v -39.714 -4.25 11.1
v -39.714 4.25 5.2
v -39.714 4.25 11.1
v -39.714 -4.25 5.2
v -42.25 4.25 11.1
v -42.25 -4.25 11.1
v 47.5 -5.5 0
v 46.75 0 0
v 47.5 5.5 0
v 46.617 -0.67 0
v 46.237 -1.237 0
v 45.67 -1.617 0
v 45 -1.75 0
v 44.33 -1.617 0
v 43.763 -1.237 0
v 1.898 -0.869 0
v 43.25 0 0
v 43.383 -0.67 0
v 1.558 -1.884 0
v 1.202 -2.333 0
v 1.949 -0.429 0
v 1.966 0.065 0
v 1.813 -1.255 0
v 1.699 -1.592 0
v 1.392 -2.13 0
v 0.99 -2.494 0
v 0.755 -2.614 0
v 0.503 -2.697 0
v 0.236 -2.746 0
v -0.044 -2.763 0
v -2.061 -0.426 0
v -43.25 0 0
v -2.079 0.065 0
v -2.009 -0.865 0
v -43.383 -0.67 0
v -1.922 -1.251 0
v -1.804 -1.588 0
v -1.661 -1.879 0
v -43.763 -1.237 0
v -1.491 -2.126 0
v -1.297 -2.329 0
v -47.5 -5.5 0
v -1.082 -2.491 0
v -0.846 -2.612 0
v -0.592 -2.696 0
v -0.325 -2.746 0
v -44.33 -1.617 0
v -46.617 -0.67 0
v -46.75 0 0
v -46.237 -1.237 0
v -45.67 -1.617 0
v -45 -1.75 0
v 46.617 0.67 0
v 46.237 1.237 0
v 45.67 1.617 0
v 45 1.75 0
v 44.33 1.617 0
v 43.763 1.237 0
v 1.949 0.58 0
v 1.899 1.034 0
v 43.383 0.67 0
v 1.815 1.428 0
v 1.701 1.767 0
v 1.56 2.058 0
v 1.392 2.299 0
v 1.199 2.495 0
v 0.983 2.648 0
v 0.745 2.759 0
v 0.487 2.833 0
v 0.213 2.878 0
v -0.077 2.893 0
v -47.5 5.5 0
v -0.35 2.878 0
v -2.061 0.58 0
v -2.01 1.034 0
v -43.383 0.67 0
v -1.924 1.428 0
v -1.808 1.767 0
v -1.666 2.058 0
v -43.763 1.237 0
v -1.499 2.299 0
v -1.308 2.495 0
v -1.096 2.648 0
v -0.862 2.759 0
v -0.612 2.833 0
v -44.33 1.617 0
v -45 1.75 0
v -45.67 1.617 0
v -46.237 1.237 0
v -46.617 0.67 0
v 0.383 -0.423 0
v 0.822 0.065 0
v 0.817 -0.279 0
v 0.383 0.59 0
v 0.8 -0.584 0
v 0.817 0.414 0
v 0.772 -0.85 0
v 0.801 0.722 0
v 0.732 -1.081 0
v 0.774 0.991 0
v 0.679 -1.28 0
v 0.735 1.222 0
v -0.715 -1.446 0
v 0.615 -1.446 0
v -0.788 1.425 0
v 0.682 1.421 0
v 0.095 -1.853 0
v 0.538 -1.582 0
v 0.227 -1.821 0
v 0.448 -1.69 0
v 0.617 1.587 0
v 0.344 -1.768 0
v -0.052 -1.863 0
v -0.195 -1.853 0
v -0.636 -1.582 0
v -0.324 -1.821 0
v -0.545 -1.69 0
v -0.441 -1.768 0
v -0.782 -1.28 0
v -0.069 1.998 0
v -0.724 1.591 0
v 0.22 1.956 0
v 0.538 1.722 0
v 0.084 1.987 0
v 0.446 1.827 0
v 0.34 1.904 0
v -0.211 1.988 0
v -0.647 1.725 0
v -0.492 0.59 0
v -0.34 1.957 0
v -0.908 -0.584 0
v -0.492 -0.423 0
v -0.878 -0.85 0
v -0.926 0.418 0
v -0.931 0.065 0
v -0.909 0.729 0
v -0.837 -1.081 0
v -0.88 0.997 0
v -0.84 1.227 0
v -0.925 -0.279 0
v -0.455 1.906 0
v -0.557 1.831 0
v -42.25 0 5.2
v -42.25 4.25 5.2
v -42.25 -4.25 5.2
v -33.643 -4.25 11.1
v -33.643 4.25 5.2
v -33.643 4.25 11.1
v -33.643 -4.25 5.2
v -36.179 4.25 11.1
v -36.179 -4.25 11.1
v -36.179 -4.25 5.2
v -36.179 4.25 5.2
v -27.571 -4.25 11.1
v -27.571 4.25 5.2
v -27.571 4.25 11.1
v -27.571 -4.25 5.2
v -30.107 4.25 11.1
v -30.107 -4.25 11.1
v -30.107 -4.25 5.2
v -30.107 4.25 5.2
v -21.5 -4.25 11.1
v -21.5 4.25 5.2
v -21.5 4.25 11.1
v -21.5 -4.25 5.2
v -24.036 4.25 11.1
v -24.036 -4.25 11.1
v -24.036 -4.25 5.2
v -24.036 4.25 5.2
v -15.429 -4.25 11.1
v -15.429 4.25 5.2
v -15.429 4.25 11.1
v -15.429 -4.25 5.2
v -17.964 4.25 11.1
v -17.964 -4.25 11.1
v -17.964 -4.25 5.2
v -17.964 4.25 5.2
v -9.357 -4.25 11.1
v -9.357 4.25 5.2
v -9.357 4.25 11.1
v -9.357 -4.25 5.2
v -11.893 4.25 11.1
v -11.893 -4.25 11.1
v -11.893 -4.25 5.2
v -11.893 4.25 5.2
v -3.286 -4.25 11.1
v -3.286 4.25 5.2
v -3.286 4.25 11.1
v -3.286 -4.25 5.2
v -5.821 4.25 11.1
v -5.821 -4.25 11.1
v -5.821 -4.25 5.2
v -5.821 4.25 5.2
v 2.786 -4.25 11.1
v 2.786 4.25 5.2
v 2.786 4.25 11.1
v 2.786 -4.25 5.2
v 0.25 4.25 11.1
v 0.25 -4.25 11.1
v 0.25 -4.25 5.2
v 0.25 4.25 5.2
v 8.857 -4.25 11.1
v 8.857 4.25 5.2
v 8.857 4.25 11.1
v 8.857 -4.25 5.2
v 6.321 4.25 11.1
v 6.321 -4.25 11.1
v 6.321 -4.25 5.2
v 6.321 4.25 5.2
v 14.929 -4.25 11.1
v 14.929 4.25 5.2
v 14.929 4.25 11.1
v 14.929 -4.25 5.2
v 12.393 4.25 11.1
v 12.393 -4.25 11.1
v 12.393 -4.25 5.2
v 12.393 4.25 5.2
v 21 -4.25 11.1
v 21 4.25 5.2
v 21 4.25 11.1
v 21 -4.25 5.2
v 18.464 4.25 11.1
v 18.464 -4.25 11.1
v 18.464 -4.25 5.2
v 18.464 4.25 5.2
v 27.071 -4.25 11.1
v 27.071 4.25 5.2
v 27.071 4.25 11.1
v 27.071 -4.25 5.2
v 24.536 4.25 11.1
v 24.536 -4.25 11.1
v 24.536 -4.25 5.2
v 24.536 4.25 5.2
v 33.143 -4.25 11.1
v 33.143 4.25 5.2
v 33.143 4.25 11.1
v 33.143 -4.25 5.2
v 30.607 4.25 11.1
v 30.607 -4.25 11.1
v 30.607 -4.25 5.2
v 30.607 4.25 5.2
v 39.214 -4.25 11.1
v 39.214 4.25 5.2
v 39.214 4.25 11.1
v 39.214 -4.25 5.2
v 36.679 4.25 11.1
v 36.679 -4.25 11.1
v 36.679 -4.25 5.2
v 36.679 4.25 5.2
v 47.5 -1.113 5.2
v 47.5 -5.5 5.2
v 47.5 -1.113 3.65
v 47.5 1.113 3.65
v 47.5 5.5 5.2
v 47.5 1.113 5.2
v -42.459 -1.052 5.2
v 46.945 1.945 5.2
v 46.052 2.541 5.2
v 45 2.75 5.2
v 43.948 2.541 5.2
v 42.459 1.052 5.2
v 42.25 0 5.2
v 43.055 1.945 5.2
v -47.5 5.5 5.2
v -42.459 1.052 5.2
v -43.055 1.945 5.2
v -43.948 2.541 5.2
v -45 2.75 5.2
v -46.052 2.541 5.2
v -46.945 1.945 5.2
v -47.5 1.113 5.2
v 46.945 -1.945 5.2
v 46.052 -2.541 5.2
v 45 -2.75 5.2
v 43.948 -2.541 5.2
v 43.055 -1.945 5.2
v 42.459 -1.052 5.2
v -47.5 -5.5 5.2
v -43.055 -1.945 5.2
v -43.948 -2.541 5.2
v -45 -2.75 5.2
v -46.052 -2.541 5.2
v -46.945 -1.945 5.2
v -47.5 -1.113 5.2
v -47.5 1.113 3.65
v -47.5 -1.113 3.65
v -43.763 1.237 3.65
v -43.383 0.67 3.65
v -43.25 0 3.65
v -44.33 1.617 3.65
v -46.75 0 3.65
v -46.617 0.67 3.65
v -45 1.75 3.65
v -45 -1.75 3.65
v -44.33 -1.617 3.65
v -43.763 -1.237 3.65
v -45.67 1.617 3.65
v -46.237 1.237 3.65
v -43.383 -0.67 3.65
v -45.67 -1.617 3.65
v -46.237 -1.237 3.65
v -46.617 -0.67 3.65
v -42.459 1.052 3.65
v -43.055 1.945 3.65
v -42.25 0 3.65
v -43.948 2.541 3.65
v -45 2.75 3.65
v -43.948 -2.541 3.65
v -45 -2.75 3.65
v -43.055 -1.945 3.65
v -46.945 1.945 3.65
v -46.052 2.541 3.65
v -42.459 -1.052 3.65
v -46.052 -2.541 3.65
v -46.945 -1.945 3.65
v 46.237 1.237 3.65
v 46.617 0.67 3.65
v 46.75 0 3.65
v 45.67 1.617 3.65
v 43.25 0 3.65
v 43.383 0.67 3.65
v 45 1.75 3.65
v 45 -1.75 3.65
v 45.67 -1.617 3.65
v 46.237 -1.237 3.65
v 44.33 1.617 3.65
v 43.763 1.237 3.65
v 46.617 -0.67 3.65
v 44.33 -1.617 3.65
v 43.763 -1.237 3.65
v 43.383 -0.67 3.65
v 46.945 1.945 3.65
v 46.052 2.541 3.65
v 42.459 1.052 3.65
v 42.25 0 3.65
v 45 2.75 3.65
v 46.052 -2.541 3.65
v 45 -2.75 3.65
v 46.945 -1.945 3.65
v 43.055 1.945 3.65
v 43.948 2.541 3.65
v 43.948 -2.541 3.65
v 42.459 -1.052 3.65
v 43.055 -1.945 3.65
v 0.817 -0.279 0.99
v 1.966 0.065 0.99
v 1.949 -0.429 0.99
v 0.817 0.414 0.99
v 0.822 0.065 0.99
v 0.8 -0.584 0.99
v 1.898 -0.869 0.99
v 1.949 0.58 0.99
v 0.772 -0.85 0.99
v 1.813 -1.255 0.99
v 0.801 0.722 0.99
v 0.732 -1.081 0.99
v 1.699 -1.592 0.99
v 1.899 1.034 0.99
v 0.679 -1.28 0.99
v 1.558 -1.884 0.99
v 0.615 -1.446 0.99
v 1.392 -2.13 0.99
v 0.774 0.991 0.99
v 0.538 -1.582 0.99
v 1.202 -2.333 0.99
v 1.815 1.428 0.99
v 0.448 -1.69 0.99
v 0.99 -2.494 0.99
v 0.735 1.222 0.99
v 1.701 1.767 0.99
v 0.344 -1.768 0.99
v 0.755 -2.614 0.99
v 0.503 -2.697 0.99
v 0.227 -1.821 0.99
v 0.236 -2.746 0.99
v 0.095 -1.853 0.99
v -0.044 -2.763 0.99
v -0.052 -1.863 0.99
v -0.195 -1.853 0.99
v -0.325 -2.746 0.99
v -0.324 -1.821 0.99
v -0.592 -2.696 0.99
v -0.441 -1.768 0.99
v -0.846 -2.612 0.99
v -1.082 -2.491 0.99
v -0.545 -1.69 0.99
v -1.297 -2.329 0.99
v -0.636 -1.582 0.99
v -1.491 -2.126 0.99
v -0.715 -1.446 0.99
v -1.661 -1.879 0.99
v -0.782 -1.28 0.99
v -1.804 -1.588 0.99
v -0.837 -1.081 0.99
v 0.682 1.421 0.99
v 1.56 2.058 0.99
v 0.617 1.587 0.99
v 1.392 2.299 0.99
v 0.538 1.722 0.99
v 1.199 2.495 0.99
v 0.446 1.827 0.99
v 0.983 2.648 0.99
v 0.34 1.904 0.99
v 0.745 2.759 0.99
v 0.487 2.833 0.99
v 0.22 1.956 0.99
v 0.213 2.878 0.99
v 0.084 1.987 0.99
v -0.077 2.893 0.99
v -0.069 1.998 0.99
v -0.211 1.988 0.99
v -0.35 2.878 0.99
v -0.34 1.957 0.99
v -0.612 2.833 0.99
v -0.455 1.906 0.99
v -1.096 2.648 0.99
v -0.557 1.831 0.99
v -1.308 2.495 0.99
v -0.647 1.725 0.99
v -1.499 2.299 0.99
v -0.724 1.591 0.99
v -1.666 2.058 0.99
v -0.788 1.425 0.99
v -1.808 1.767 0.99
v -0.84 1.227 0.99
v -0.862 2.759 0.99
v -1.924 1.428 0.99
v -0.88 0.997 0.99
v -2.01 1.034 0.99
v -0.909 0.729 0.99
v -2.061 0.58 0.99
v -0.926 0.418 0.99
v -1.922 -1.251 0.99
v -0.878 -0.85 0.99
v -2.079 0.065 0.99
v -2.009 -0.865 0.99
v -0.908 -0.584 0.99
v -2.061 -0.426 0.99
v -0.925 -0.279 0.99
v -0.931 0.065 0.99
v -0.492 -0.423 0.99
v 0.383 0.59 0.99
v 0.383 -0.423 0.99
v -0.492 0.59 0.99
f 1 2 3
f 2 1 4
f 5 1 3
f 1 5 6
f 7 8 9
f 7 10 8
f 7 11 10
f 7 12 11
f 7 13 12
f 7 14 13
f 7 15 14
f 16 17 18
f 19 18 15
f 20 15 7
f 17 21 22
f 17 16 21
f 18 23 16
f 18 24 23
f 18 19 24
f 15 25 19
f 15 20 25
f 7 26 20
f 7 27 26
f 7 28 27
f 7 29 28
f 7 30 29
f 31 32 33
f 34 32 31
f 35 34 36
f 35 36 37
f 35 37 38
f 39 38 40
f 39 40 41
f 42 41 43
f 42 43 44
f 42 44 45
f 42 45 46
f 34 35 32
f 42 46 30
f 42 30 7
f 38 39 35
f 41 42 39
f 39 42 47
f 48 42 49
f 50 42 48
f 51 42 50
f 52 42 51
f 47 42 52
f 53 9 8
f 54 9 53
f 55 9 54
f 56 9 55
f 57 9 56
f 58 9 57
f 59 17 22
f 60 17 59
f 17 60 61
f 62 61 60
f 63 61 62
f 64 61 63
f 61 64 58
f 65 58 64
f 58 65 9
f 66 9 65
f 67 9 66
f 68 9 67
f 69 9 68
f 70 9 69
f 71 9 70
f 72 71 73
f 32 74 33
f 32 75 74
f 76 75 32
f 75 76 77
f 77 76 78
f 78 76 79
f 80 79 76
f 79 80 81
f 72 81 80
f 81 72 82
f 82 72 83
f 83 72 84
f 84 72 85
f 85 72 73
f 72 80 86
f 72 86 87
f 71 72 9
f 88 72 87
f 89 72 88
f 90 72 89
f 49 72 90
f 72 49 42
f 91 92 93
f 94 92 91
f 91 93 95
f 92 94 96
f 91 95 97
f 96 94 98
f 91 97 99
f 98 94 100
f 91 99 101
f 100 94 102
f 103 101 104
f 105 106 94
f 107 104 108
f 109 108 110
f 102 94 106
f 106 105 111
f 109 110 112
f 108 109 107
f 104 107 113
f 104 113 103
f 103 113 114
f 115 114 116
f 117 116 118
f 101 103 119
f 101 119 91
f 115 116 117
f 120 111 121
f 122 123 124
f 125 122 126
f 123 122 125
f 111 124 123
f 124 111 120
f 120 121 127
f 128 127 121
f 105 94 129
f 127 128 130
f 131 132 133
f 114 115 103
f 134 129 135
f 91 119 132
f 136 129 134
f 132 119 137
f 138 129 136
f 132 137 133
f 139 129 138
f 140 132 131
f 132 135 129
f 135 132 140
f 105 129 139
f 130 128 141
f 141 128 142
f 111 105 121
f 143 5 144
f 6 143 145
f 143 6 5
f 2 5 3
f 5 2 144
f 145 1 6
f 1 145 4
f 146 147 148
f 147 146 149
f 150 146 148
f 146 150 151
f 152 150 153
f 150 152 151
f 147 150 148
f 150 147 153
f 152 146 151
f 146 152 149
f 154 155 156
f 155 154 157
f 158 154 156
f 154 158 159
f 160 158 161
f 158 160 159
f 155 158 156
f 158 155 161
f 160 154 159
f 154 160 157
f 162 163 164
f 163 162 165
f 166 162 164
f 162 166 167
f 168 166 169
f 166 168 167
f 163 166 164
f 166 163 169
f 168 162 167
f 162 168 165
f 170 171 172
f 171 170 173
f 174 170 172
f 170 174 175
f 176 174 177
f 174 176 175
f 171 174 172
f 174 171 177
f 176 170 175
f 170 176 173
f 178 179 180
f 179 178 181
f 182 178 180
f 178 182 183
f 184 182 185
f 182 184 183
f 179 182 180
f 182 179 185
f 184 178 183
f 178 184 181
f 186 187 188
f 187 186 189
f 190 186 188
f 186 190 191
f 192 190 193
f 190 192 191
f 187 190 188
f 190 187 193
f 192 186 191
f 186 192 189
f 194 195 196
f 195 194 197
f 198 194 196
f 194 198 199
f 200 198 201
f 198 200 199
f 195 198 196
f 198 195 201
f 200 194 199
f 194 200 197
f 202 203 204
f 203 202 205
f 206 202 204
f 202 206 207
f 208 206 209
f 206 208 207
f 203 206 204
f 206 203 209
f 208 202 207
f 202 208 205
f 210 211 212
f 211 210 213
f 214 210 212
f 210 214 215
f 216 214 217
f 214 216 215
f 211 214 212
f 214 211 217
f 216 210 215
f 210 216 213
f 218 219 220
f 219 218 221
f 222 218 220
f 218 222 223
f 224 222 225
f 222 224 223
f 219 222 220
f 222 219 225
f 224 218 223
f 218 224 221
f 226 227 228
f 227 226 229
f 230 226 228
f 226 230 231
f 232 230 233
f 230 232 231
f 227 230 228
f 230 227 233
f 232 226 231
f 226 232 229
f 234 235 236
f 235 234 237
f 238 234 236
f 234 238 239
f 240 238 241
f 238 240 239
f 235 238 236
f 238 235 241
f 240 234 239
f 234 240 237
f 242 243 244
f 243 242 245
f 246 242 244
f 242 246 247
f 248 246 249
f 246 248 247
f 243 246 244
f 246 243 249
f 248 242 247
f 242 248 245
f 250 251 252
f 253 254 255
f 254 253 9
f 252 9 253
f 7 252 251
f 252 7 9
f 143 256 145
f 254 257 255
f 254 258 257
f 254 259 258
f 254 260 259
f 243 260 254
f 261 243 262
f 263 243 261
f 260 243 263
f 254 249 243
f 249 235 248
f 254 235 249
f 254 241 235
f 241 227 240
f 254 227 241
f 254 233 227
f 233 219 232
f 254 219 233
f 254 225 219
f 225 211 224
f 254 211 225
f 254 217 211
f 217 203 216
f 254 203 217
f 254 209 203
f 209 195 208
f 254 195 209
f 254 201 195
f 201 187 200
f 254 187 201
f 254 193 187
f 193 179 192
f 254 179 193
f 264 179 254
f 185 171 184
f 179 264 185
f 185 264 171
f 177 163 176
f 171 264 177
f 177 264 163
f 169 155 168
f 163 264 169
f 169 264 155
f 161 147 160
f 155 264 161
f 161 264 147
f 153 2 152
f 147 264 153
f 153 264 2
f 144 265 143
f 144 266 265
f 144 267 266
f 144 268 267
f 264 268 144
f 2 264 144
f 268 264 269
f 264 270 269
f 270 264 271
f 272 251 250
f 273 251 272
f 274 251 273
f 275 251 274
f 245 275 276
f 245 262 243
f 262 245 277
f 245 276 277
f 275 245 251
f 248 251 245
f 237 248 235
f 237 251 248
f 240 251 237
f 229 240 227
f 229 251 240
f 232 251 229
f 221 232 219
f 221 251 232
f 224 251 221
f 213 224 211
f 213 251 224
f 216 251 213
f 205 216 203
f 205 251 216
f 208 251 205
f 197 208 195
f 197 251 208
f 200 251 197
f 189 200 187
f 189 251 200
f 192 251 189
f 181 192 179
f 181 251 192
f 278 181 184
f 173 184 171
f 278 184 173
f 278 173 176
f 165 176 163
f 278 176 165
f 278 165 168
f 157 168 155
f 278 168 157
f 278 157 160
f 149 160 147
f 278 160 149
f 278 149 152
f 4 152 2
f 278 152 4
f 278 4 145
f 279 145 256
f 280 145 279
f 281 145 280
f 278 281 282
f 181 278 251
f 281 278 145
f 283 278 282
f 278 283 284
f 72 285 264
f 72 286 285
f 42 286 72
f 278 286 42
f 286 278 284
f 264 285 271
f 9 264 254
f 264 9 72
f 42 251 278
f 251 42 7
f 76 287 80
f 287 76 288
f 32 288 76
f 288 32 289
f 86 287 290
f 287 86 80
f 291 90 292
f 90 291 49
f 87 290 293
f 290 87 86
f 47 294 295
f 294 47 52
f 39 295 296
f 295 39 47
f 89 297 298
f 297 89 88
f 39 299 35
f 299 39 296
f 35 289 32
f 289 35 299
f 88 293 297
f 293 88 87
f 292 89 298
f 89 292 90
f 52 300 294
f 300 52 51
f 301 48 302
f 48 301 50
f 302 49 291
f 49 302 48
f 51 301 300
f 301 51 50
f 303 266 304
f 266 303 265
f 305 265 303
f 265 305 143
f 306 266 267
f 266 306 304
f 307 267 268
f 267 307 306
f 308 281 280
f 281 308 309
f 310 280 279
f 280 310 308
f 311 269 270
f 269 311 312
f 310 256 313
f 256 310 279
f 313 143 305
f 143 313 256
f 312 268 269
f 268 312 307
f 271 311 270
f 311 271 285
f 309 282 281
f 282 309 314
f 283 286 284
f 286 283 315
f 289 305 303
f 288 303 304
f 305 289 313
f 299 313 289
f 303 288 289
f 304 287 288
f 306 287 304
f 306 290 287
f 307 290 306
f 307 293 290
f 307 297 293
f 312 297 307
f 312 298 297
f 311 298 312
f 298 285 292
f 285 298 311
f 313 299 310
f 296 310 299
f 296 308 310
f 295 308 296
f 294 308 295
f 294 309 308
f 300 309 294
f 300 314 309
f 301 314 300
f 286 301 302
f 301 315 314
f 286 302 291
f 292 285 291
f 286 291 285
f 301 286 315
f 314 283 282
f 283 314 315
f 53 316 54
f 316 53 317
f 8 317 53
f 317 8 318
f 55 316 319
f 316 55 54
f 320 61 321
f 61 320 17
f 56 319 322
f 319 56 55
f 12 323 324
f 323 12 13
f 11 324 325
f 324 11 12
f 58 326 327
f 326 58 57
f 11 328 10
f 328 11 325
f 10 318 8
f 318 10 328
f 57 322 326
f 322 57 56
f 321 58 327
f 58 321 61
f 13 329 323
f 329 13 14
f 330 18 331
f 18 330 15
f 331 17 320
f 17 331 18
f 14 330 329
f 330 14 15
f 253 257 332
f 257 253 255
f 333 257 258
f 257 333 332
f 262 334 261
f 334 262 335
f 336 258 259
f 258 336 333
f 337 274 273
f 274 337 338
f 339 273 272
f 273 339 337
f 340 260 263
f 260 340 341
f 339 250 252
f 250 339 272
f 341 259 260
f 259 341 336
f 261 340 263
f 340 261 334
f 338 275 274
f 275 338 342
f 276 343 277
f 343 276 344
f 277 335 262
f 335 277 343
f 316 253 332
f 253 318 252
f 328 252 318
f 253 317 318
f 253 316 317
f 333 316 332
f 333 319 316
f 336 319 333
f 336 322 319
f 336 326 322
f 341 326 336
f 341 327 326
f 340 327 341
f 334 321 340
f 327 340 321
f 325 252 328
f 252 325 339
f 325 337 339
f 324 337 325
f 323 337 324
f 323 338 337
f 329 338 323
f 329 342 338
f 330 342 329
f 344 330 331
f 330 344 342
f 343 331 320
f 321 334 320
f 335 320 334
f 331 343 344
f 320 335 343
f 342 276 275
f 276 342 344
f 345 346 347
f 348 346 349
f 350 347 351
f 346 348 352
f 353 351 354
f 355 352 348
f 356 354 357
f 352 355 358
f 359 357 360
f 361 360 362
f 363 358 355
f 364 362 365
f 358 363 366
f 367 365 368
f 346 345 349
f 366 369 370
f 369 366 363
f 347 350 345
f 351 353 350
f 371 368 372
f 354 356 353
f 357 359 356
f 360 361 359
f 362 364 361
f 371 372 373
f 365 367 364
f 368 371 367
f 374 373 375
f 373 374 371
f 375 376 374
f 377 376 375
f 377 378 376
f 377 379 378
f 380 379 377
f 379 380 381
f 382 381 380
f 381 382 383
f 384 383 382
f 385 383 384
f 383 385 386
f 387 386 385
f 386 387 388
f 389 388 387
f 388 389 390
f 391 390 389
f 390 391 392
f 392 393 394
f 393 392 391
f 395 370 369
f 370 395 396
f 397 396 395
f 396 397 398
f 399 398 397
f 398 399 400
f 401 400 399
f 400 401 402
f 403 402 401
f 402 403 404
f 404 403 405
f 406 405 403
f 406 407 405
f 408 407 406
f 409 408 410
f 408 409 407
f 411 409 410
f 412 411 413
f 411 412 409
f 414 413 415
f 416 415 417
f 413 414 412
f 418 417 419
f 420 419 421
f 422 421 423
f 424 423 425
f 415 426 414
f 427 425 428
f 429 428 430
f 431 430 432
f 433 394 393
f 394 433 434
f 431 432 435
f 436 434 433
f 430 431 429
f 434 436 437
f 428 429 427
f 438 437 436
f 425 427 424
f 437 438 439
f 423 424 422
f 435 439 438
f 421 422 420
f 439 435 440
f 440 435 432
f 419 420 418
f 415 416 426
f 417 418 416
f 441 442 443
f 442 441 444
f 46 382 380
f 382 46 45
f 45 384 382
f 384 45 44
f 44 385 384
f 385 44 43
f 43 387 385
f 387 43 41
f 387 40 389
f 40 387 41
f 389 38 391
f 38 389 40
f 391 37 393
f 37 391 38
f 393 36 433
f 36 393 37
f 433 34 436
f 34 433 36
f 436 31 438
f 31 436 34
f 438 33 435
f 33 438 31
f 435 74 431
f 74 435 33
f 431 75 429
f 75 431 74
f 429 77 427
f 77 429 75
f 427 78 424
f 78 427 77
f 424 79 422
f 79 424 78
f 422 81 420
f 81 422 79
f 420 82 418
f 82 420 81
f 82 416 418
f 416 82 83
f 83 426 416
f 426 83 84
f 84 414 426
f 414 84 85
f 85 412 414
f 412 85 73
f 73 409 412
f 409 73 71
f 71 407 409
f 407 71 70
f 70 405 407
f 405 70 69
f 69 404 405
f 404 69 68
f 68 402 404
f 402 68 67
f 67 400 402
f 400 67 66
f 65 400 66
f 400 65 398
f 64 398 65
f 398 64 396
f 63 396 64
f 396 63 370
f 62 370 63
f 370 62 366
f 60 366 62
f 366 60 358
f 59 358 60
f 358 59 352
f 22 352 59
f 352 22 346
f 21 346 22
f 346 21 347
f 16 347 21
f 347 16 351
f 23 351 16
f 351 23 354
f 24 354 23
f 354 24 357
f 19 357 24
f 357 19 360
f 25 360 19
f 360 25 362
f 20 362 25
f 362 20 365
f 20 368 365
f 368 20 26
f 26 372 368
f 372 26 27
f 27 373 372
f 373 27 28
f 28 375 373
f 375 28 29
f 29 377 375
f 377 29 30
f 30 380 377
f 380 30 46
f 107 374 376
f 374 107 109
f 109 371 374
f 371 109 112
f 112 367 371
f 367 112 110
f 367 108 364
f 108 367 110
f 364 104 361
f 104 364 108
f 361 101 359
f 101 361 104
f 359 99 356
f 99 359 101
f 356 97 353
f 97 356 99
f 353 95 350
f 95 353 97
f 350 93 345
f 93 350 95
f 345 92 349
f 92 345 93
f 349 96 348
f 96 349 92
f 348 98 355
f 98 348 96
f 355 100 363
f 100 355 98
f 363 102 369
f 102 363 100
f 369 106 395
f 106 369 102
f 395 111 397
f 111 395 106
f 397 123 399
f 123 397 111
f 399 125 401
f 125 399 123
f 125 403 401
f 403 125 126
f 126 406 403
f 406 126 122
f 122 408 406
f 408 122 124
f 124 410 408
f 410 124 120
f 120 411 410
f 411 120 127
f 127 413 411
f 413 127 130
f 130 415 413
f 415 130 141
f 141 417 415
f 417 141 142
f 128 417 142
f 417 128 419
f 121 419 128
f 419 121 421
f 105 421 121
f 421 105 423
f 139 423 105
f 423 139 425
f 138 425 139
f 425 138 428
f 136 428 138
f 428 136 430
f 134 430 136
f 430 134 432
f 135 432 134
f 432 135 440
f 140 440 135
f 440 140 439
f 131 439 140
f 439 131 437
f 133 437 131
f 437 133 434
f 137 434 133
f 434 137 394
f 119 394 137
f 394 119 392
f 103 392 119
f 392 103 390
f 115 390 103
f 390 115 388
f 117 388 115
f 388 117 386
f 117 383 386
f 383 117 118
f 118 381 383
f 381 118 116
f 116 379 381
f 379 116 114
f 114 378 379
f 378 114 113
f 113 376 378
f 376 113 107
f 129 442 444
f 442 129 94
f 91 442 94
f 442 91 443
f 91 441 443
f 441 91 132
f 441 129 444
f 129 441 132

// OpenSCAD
// file: ../code/code.scad
// code stripes 
//
// to do:
// - convert code in bits using loop, if possible with scad
// - consider other forms than cubes (why not characters?)

include <code_dim.scad>

module code_label(code=0,type=0){
 code_str=str(code);   
 if(type==0)   
 cube([label_width,label_thick,label_height],center=true);            
 rotate([90,0,180])linear_extrude(height = label_text_thick) 
 text(code_str,
    font = "Courier:style=Bold",
    size=label_size,
    halign ="center",
    valign ="center");
}

module code_stripe(code=code,s=[100,8,10],inv=0){
       
 bit_x=s.x/code_n/2; // x dimension of half bit without pass considered   
    
 function bit(inv=0,bit=0,x=0)=(inv==0)
  ?bit_x*(2*x+bit+1/2)
  :bit_x*(((bit+1)%2)+2*x+1/2);  ;  
  
 function zpos(inv=0)=(inv==0)
  ?s.z/2-pass/2
  :s.z/2+pass/2;        
          
 function get_bit(x=0)=((x%2)==0)? 0:1;
 function get_rest(x=0)=floor(x/2);  
 function p(x)=pow(2,x);
 
 // since variables can not be overwritten in OpenSCAD as required in lops 
 // individual variables per bits are created     
 d13=floor((code                                                                                                                )/p(13));
 d12=floor((code-d13*p(13)                                                                                                      )/p(12));     
 d11=floor((code-d13*p(13)-d12*p(12)                                                                                            )/p(11));         
 d10=floor((code-d13*p(13)-d12*p(12)-d11*p(11)                                                                                  )/p(10));
 d9 =floor((code-d13*p(13)-d12*p(12)-d11*p(11)-d10*p(10)                                                                        )/p(9));          
 d8 =floor((code-d13*p(13)-d12*p(12)-d11*p(11)-d10*p(10)-d9*p(9)                                                                )/p(8));       
 d7 =floor((code-d13*p(13)-d12*p(12)-d11*p(11)-d10*p(10)-d9*p(9)-d8*p(8)                                                        )/p(7));    
 d6 =floor((code-d13*p(13)-d12*p(12)-d11*p(11)-d10*p(10)-d9*p(9)-d8*p(8)-d7*p(7)                                                )/p(6));     
 d5 =floor((code-d13*p(13)-d12*p(12)-d11*p(11)-d10*p(10)-d9*p(9)-d8*p(8)-d7*p(7)-d6*p(6)                                        )/p(5));          
 d4 =floor((code-d13*p(13)-d12*p(12)-d11*p(11)-d10*p(10)-d9*p(9)-d8*p(8)-d7*p(7)-d6*p(6)-d5*p(5)                                )/p(4));       
 d3 =floor((code-d13*p(13)-d12*p(12)-d11*p(11)-d10*p(10)-d9*p(9)-d8*p(8)-d7*p(7)-d6*p(6)-d5*p(5)-d4*p(4)                        )/p(3));   
 d2 =floor((code-d13*p(13)-d12*p(12)-d11*p(11)-d10*p(10)-d9*p(9)-d8*p(8)-d7*p(7)-d6*p(6)-d5*p(5)-d4*p(4)-d3*p(3)                )/p(2));        
 d1 =floor((code-d13*p(13)-d12*p(12)-d11*p(11)-d10*p(10)-d9*p(9)-d8*p(8)-d7*p(7)-d6*p(6)-d5*p(5)-d4*p(4)-d3*p(3)-d2*p(2)        )/p(1));   
 d0 =floor((code-d13*p(13)-d12*p(12)-d11*p(11)-d10*p(10)-d9*p(9)-d8*p(8)-d7*p(7)-d6*p(6)-d5*p(5)-d4*p(4)-d3*p(3)-d2*p(2)-d1*p(1))/p(0));   

 d=[d0,d1,d2,d3,d4,d5,d6,d7,d8,d9,d10,d11,d12,d13];
       
 for (x = [ 0 : code_n - 1 ]) {    
    translate([bit(inv,d[x],x),
                   0,
                   zpos(inv)])
    
    cube([bit_x-pass, 
              s.y,
              s.z-pass],
             center=true);    // coded bits
      
    if(       ((d[x]==0)&&(d[x-1]==1)&&(inv==0))  
           ||  ((d[x]==1)&&(d[x-1]==0)&&(inv==1))  )
        {
          translate([x*bit_x*2,
                        0,
                        zpos(inv)])
          cube([pass*2,s.y,s.z-pass],center=true);  // fillers for not necessary pass gaps
    }
 }    
}

//
code=218;
//code=0;
//code=pow(2,code_n)-1;
s=[100,8,10];

//
color("Red")
code_stripe(code=code,s=s,inv=0);
//
color("Blue")
code_stripe(code=code,s=s,inv=1);

//translate([0,0,20])code_label(code=code,type=1);
// file: ../linurs/linurs_screw.scad
// Metric screws and nuts 
// urs@linurs.org 2019
// It is targeted for 3D printing applications. 
// To look realistic is not the goal (Example: Nuts do not have a hole)

include <linurs_screw_dim.scad>

// Changes
//2019-02-09 split in two files
//2017-05-19 bug fix hexbolt had wrong diameter
//2017-01-22 bug fix lentgh of hex scre is outer lenght as other screw types
//2017-01-06 added hex screw
//2015-10-12 added screw_cut
//2015-11-29 screw_fix parameter sunk added, and module hex_bolt

// Consistent parameters in this file
// d screw diameter M2_5, M3, ... (enumeration with screw_d)
// t millimeters added to diameters 
//   For the screw, head, nut = 0. 
//   For the piece where the screw, nut, ... passes through = 0.5 so it slides in well

// functions used multiple times to position nuts and heads
function headh_cyl(d)=screw_cyl[d][1];  // height of cyl screw head
function headh_cnt(d)=screw_cyl[d][1];  // height of cnt screw head
function headh(d,type=head_cyl)=(type==head_cyl ? headh_cyl(d) : (type==head_cnt ? headh_cnt(d) : 0 )); // height of screw head 

function nuth(d)=screw_hex[d][2];   // height of hex nut

// head of a cylinder screw
module screw_head_cyl(d=M3, t=0)
{
  screwhd=screw_cyl[d][0]+t; // diameter of cylinder screw head
  cylinder(d=screwhd,h=headh(d=d, type=head_cyl), center=true,$fn=16); // screw head
}

// head of a countersunk screw
module screw_head_cnt(d=M3, t=0)
{
  screwd=screw_d[d]+t; 
  screwhd=screw_cnt[d][0]+t; // diameter of cylinder screw head
  cylinder(d1=screwd,d2=screwhd,h=headh(d=d,type=head_cnt), center=true,$fn=16); // screw head
}

// head of a hex screw
module screw_head_hex(d=M3, t=0)
{
    translate([0,0,-nuth(d)/2])nut(d=d, t=t);
}

// head of all screws
module screw_head(d=M3, type=head_cyl, t=0)
{ 
  if(type==head_cnt){
    screw_head_cnt(d=d, t=t);
  } else {
    if(type==head_cyl){
      screw_head_cyl(d=d, t=t);
    } else {
       if(type==head_hex){
           screw_head_hex(d=d, t=t); 
       } 
    }    
  }
}

// hex bolt 
module hex_bolt(d=M3, h=10, t=0)
{
  nutd=screw_hex[d][1]+t; // outer diameter of hex bolt
  cylinder(r=nutd/2,h=h+t, center=true,$fn=6); // nut
}

// nut 
module nut(d=M3, t=0)
{
  hex_bolt(d=d, h=nuth(d), t=t);    
}

// screw 
// w outer width of the screw = screw length + head 
module screw(w=10, d=M3, type=head_cyl, t=0){
  screwd=screw_d[d]+t;       // screw diameter
  cylinder(d=screwd, h=w, center=true,$fn=16); // screw thread length
  translate([0,0,w/2-headh(d=d,type=type)/2])
  screw_head(d=d,type=type, t=t);
}

// screw fix
// w outer width of the screw = screw length + head 
// sink additional material below to remove 
// raise additional material above to remove
module screw_fix(w=10, d=M3, type=head_cyl, sink=0, raise=0, t=0){
  screw(w=w-sink*2, d=d, type=type, t=t);
  translate([0,0,-(w-sink*2)/2+nuth(d)/2])
    nut(d=d,t=t);
  //additional material to be removed above the nut  
  translate([0,0,-(w-sink+raise)/2])hex_bolt(d=d,h=sink+raise+0.01,t=t);    
  //additional material to be removed above the screw head
  if(type==head_cnt){  
    translate([0,0,(w-sink+raise)/2])
    cylinder(d=screw_cnt[d][0]+t,h=sink+raise+0.01,center=true,$fn=16);
  }else{ 
    translate([0,0,(w-sink+raise)/2])
    cylinder(d=screw_cyl[d][0]+t,h=sink+raise+0.01,center=true,$fn=16);
  }     
}
//screw_fix();
//translate([10,0,0])screw_fix(sink=2,type=head_cnt);
//

// screw cut
// material to be extracted from object to slide in a counter sunk screw for fixation
// w height of the cut out
// i depth of the screw
module screw_cut(d=M3,w=20,i=10,t=0,fn=32){
    hsh=screw_cnt[d][1];
    ws=screw_cnt[d][0]+t;
    ds=screw_d[d]+t;
    
    translate([i/2,0,-(w-hsh)/2])
      cube([i,ws,hsh],center=true);
    
    translate([0,0,-(w-hsh)/2])
      cylinder(d=ws,h=hsh,center=true,$fn=32);
    
    translate([0,0,-(w-hsh)/2+hsh])
        cylinder(d2=ds, d1=ws, h=hsh,center=true,$fn=fn);
    
    cylinder(h=w, d=ds, center=true, $fn=fn);   
    
    translate([i/2,0,0]) 
        cube([i,ds,w],center=true);
    
    for(y=[-1,1]){
        translate([i/2,y*ds/2,-w/2+hsh])
            rotate([45,0,0])
            cube([i,sqrt(2)*(ws-ds)/2,sqrt(2)*(ws-ds)/2],center=true);
    }
}
//screw_cut();

// nut cut
// material to be extracted from object to slide in a nut for fixation
// w height of the cylinder
// i lenght of the inlet
module nut_cut(w=10, wi=0, d=M3, i=10, t=0, raise=0, type=head_cyl){ 
  nut(d,t);
  translate([i/2,0,0])
    cube([i,screw_hex[d][0]+t,nuth(d)+t],center=true);
  translate([0,0,-wi])
      if(type==head_cnt){    
          screw(w=w, d=d, type=type, t=t); 
        translate([0,0,(w+raise)/2-0.01])
          cylinder(d=screw_cnt[d][0]+t,h=raise,center=true,$fn=16);
      }else{ 
          screw(w=w, d=d, type=type, t=t);   
        translate([0,0,(w+raise)/2-0.01])
          cylinder(d=screw_cyl[d][0]+t,h=raise,center=true,$fn=16);
      }       
}
//nut_cut(raise=2,type=head_cnt,i=14,w=20,wi=2, t=1);

// present the library
show=1;

if(show==1){
    grid=20;
    
    for (j=[0:10]){
        for (i=[0:3])
           translate([j*grid,i*grid,0]){  
           
    // elements           
           if(j==0){
             screw_fix(w=(i+2)*5,d=i, type=head_cyl, t=0);
           }
       
           if(j==1){
             nut(d=i,t=0);
           } 
       
           if(j==2){   
              screw(d=i,t=0);
           } 
           
           if(j==3){   
              screw(d=i,t=0,type=head_cnt);
           } 
           
           if(j==4){   
              screw(d=i,t=0,type=head_hex);
           } 
           
           if(j==5){   
              hex_bolt(d=i,t=0);
           } 
           
       }
    }   
     
    for (j=[0:2]){
        for (i=[0:3])
           translate([j*grid,-(i+1)*grid,0]){  
             difference(){
                cube([3*screw_d[i],3*screw_d[i],(i+2)*5-0.1],center=true);    
    
                if(j==0){
                  screw_fix(w=(i+2)*5,d=i,type=head_cnt, t=0.5);
                }   
                
                if(j==1){
                  nut_cut(d=i,w=(i+2)*5);
                }
                if(j==2){
                  screw_cut(d=1,w=(i+2)*5);
                }
            
             }
           }  
        
    }
}
   
// file: ../linurs/linurs_screw_dim.scad
// Metric screws and nuts 
// urs@linurs.org 2015

// contains dimensions of linurs_screw and can be included in other 
// OpenScad files 


// Consistent parameters in this file
// d screw diameter M2_5, M3, ... (enumeration with screw_d)
// t millimeters added to diameters 
//   For the screw, head, nut = 0. 
//   For the piece where the screw, nut, ... passes through = 0.5 so it slides in well

// enumerations of metric threads
M2_5=0;
M3=1;
M4=2;
M5=3;

// enumerations screw head type
head_cyl=0; // cylinder
head_cnt=1; // countrsunk
head_no=2;  // no head at all
head_hex=3;  // no head at all

// screw diameters
screw_d=[
2.5, // M2.5
3.0, // M3
4.0, // M4
5.0  // M5
];

// sizes for hex nuts
screw_hex=[
//   s,   e,   h
 [ 5.0, 5.8, 1.7], // M2.5
 [ 5.5, 6.4, 2.0], // M3
 [ 7.0, 8.1, 2.8], // M4
 [ 8.0, 9.2, 3.5]  // M5
];

// sizes for cylinder screw heads
screw_cyl=[
//   d,   h
 [ 4.5, 1.6], // M2.5
 [ 5.5, 2.0], // M3
 [ 7.0, 2.6], // M4
 [ 8.5, 3.3]  // M5
];

// sizes for countersunk screw heads
screw_cnt=[
//   d,   h
 [ 4.7, 1.50], // M2.5
 [ 5.6, 1.65], // M3
 [ 7.4, 2.20], // M4
 [ 9.2, 2.50]  // M5
];
// file: ../code/code_dim.scad
// codings
code_n=14;  // number of bits
pass=0.5; // gap between the code stripes

// label for the code
label_width=24;
label_thick=0.5;
label_size=6;
label_text_thick=1;
label_height=label_size+2;
// file: connector_dim.scad
// connector
// Connector to be mounted on pcb of the modules

pcb_thick=1.6;

con_w=87.5;   // width of connector bodywithout flanges of mounting holes 
con_d=2.8;    // diameter of mounting holes
con_d_w=88.9; // distance between mounting holes
con_m_h=6;    // height of mounting cube
con_h=13;     // largest z dimension

pcb_d_h=10.2;  // ???

// connector dimensions
motherboard_con_head_w=85;  // width of the connector head
motherboard_con_head_d=8.5; // depth of the connector head
motherboard_con_w=95;       // largest width of the connector
motherboard_con_h=11.6;     // largest height of the connector
motherboard_con_t=11;       // largest depth of the connector
motherboard_con_d_w=90;     // distance between mounting holes
motherboard_con_d=2.8;      // diameter of mounting holes
motherboard_con_out=5.2;    // height produced by the connector when pulgged in 

// pcb module connector dimension
pcbmodule_con_out=13-(5.3+2.8-2.54);  // distance connector sticks out of pcb

// for codings
//code=2157;
//code_n=14;
//code_l=motherboard_con_head_w/code_n/2;
//
//label_width=24;
//label_thick=0.5;
//label_size=6;
//label_text_thick=1;
//label_height=label_size+2;
//pass=0.5;
// file: connector.scad
// - rename connector to male_connector
// - translate male connector and rotate (should as to be used for PCB)
include <connector_dim.scad>
include <../code/code_dim.scad>
include <../linurs/linurs_screw_dim.scad>

use <../linurs/linurs_screw.scad>
use <../code/code.scad>

module motherboard_con(type=0,code=0){ //,label=0){
  //color("LightGrey")
  difference(){
    union(){
      if(type==0){  
        translate([0,0,motherboard_con_h/2])
          cube([motherboard_con_head_w,
              motherboard_con_head_d,
              motherboard_con_h],
              center=true);  // upper body of the connector down to motherboard level
      }    
      translate([0,0,motherboard_con_out/2])
        cube([motherboard_con_w,
              motherboard_con_t,
              motherboard_con_out],
              center=true); // lower body of the connector laying on mother board  
      if(type==2){
          translate([-motherboard_con_head_w/2,0,0])
        code_stripe(code=code,s=[motherboard_con_head_w,motherboard_con_head_d,motherboard_con_h],inv=0); 
      }    
    }
    for(i=[-1,1]){ // mounting holes
      translate([i*motherboard_con_d_w/2,0, motherboard_con_out/2])
      screw(w=motherboard_con_out+0.1, d=M2_5, type=head_cyl, t=1);
    }
    if(type==2){  // add label
     translate([0,0, label_text_thick-0.01])rotate([-90,0,0])
       code_label(code=code, type=1);  // label
    }
  }
}

//motherboard_con();
//translate([0,20,0])motherboard_con(type=1);
//translate([0,40,0])
//motherboard_con(type=2,code=d, code_str=str(code));

module connector(type=0,code=0, step=25.4){
  echo("connector");
     
  coding_height=motherboard_con_h-motherboard_con_out;   
  spacer_t=step/2-motherboard_con_t;  
  function get_thick(type=0)=(type==1)? spacer_t+pcb_thick:0; 
    
  difference(){
    union(){// add material  
         
      translate([con_w/2,
        (pcb_thick+motherboard_con_t-get_thick(type))/2,
        (coding_height+con_h)/2])  
        cube([con_w,
            motherboard_con_t-pcb_thick+get_thick(type),
          con_h-coding_height
        ],center=true); // main body of the connector
        
      for(x=[(con_w-con_d_w)/2,con_w+(con_d_w-con_w)/2]){ // add the two brackets
        translate([x,con_m_h/2+pcb_thick,pcb_d_h])
          cube([2*con_d,
                con_m_h,
                2*con_d],center=true);   
      }

      if(type==0){
      translate([
             con_w/2,
             motherboard_con_t/2,
             coding_height/2])
      cube([
            con_w,
            motherboard_con_t,
            coding_height],center=true);  
      }
      
      if(type==1){
             translate([
                           (con_w-motherboard_con_head_w)/2,               
                           motherboard_con_t/2,
                           0])
               code_stripe(code=code,
                   s=[motherboard_con_head_w,motherboard_con_head_d,con_h], inv=1); 
        
        translate([con_w/2,
                   label_thick/2+pcb_thick-get_thick(type),
                   con_h-coding_height+coding_height+label_height/2])
                   code_label(code=code);             
      }      
    }    
    
    for(x=[(con_w-con_d_w)/2,con_w+(con_d_w-con_w)/2]){
      translate([x,con_m_h/2+pcb_thick/2,pcb_d_h])
      rotate([90,0,0])
        screw_fix(w=con_m_h+pcb_thick, d=M2_5, type=head_cyl, sink=0, raise=con_m_h, t=0.5);
    }
  }
}

//code=12;
// code minuimum
//code=0;
// code maximum
//
code=pow(2,code_n)-1;

translate([0,
                 motherboard_con_t/2,
                 -motherboard_con_out  ])
motherboard_con(type=2,code=code);

 translate([-con_w/2,
                  0,
                  0])  
connector(type=1,code=code);
// main file
// file to be called at command line to produce coded connectors
use <connector.scad>

code=0;
motherboard_con(type=2,code=code);
